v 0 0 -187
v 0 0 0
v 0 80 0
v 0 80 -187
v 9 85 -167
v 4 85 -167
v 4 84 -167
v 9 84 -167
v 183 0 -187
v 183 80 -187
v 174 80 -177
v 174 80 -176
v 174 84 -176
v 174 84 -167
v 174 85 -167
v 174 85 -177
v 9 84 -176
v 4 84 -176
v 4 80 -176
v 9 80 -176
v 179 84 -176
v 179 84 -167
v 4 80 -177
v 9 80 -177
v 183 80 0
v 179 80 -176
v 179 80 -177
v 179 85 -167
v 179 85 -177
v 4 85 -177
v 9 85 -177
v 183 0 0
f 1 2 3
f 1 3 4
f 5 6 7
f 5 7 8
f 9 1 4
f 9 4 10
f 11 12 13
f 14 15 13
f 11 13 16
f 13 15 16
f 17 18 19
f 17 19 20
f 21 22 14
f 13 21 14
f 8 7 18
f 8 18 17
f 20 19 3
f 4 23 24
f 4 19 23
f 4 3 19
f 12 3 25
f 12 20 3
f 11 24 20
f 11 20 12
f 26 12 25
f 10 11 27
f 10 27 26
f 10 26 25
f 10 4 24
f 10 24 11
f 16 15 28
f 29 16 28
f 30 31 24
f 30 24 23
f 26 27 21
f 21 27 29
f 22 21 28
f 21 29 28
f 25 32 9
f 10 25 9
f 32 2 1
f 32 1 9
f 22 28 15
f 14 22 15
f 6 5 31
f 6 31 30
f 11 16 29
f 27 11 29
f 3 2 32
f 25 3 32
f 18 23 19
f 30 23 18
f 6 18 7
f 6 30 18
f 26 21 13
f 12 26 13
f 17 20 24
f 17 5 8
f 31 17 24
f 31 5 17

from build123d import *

# Parameters (mm, degrees)
SKETCH_1_W      = 183
SKETCH_1_H      = 187
EXTRUDE_1_DEPTH = 80
SKETCH_3_W      = 5
SKETCH_3_H      = 1


with BuildPart() as part:
    # 草图1 → 拉伸1 (new body)
    with BuildSketch(Plane(origin=(0, 0, 0), x_dir=(1, 0, 0), z_dir=(0, 1, 0))):
        with Locations((91.5, 93.5)):
            Rectangle(SKETCH_1_W, SKETCH_1_H)
    extrude(amount=EXTRUDE_1_DEPTH)

    # 扫描1: sweep along a path in 草图4
    with BuildLine(Plane.ZY.offset(-4)) as sweep_1_path:
        Line((-177, 80), (-177, 85))
        Line((-177, 85), (-167, 85))
    # 草图3 → 扫描1 (sweep)
    with BuildSketch(Plane(origin=(0, 80, 0), x_dir=(-1, 0, 0), z_dir=(0, 1, 0))):
        with Locations((-6.5, -176.5)):
            Rectangle(SKETCH_3_W, SKETCH_3_H)
    sweep_1 = sweep(path=sweep_1_path.line, transition=Transition.RIGHT)

    # 镜向2: 扫描1 across plane
    add(sweep_1.mirror(Plane.ZY.offset(-91.5)))


solid = part.part
